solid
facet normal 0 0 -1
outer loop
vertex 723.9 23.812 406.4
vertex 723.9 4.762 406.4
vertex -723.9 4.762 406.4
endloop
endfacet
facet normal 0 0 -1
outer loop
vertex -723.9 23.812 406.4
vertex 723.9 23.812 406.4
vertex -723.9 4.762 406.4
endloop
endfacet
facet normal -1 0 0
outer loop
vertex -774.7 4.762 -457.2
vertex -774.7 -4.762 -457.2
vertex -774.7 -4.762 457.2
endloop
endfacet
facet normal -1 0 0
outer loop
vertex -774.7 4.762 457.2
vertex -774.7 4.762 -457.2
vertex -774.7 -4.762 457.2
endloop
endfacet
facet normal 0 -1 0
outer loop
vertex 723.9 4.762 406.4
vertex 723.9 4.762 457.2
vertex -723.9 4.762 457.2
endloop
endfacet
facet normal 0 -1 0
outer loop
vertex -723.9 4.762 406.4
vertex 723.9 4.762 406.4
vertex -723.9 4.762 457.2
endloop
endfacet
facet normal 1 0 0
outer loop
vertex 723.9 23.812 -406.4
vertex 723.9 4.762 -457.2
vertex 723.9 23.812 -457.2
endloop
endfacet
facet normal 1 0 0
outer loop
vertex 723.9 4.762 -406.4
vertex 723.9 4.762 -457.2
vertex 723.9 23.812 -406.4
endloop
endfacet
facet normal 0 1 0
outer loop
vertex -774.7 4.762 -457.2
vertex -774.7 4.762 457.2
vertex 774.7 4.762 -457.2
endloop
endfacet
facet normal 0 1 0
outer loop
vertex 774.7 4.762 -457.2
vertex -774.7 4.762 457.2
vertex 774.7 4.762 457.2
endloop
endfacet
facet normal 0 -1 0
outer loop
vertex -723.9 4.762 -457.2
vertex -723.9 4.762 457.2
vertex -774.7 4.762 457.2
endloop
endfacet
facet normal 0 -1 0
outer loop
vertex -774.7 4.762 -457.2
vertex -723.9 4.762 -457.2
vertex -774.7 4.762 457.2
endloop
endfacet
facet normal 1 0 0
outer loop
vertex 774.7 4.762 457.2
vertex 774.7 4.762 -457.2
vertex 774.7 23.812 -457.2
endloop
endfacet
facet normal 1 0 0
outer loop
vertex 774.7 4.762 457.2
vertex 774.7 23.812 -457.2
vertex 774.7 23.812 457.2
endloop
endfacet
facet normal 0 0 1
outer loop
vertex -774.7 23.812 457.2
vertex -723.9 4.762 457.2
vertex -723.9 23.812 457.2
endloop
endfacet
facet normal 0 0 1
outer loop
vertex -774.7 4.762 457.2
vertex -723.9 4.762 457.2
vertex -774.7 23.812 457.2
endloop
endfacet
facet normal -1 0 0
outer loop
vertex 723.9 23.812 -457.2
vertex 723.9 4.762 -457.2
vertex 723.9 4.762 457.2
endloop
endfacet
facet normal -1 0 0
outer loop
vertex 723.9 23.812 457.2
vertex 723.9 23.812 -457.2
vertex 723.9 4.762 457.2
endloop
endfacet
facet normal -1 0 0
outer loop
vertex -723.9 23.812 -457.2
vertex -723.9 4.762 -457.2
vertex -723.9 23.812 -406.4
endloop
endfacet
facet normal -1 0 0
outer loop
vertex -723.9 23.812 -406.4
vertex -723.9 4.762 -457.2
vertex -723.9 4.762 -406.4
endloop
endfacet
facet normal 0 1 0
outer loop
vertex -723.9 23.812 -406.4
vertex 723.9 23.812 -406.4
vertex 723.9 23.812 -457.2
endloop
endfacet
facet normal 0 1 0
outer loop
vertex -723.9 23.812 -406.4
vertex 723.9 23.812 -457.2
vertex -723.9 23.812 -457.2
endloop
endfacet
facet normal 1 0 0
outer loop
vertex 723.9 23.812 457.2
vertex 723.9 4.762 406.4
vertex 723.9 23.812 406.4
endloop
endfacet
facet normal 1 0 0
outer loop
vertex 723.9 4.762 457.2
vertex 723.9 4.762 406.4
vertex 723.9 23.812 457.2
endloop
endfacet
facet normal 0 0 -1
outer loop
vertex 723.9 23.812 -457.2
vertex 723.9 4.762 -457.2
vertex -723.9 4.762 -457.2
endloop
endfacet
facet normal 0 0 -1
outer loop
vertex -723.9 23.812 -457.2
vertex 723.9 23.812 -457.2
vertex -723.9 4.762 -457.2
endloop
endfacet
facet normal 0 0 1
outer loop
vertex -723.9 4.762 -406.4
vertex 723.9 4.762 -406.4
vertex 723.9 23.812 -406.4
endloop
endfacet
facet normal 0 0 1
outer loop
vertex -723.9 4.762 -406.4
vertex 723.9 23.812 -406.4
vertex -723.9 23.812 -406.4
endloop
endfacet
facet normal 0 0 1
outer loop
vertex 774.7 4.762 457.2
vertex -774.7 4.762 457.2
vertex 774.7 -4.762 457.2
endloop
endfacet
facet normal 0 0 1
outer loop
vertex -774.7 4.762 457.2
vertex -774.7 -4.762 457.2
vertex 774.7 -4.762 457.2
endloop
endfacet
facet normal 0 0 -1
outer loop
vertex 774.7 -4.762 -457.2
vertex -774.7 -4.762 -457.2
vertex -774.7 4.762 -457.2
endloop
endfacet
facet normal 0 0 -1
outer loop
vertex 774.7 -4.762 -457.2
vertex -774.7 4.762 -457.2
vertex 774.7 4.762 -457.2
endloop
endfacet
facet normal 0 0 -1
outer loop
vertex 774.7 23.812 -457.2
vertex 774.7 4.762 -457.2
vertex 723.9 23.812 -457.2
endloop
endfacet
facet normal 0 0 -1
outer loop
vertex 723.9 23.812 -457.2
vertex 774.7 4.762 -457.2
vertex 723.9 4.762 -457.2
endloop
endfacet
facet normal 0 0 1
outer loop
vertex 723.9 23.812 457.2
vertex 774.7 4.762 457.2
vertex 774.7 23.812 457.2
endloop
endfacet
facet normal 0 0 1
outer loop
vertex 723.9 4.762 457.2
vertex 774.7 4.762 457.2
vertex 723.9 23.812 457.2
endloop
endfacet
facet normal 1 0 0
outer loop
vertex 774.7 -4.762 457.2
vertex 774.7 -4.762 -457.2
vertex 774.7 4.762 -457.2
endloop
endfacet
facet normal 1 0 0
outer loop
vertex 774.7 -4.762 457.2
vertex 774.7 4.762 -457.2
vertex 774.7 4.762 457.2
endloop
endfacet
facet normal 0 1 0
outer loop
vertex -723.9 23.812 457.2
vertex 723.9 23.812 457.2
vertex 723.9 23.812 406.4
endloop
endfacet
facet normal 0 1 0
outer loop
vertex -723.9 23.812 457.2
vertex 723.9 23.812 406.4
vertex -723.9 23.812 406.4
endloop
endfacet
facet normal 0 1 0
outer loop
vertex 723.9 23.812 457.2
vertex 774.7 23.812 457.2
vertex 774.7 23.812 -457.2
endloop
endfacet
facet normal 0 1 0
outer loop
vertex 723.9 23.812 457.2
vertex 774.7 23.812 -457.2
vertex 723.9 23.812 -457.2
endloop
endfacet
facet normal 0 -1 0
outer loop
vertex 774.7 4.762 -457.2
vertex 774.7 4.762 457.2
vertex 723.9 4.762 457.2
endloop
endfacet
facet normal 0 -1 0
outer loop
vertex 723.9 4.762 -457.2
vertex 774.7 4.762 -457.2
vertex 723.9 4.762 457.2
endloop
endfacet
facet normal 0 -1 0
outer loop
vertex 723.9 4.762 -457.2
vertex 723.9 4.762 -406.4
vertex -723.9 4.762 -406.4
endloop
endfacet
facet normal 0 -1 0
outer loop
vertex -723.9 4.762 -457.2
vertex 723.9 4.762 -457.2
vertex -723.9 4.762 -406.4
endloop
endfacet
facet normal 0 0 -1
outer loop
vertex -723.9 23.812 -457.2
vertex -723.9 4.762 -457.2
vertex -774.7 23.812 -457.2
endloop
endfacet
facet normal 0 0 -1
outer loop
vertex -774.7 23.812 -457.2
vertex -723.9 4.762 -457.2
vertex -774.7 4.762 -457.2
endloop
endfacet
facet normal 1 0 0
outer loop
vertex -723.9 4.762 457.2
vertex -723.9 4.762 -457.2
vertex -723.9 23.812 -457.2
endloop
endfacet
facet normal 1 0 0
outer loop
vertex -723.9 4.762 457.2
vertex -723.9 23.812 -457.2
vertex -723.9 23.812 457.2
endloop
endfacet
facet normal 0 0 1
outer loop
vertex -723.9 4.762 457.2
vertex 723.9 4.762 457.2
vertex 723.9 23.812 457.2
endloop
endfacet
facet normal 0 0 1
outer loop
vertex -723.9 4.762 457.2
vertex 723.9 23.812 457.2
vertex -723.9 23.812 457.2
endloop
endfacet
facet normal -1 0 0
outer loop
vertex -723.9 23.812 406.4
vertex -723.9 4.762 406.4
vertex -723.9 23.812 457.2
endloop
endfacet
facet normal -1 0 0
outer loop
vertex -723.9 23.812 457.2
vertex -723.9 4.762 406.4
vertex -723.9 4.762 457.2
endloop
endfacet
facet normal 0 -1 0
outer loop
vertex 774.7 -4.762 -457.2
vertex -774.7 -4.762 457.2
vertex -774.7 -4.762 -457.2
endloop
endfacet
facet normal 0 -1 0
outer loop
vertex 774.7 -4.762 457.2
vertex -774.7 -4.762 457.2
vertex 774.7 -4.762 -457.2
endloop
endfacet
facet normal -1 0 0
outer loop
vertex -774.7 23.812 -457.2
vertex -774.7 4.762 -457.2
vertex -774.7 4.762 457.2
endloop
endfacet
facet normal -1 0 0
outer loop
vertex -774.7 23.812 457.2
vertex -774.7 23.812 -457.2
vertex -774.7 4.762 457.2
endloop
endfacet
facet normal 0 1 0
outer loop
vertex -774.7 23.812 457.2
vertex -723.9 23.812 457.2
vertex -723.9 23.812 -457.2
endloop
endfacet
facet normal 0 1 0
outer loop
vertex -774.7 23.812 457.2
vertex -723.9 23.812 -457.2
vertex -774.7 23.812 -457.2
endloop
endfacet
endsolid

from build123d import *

# Parameters (mm, degrees)
F0_W     = 1549.4
F0_H     = 914.4
F1_DEPTH = 4.7625
F2_W     = 50.8
F2_H     = 914.4
F3_DEPTH = 19.05
F4_W     = 1447.8
F4_H     = 50.8
F5_DEPTH = 19.05


with BuildPart() as f1:
    # F0 (on Front) → F1 (new body, symmetric)
    with BuildSketch(Plane.XZ):
        Rectangle(F0_W, F0_H)
    extrude(amount=F1_DEPTH, both=True)


with BuildPart() as f3:
    # F2 (on face) → F3 (new body)
    with BuildSketch(Plane(origin=(0, 4.7625, 0), x_dir=(-1, 0, 0), z_dir=(0, 1, 0))):
        with Locations((-749.3, 0)):
            Rectangle(F2_W, F2_H)
        with Locations((749.3, 0)):
            Rectangle(F2_W, F2_H)
    extrude(amount=F3_DEPTH)


with BuildPart() as f5:
    # F4 (on face) → F5 (new body)
    with BuildSketch(Plane(origin=(0, 4.7625, 0), x_dir=(-1, 0, 0), z_dir=(0, 1, 0))):
        with Locations((0, 431.8)):
            Rectangle(F4_W, F4_H)
        with Locations((0, -431.8)):
            Rectangle(F4_W, F4_H)
    extrude(amount=F5_DEPTH)


solid = Compound([f1.part, f3.part, f5.part])
